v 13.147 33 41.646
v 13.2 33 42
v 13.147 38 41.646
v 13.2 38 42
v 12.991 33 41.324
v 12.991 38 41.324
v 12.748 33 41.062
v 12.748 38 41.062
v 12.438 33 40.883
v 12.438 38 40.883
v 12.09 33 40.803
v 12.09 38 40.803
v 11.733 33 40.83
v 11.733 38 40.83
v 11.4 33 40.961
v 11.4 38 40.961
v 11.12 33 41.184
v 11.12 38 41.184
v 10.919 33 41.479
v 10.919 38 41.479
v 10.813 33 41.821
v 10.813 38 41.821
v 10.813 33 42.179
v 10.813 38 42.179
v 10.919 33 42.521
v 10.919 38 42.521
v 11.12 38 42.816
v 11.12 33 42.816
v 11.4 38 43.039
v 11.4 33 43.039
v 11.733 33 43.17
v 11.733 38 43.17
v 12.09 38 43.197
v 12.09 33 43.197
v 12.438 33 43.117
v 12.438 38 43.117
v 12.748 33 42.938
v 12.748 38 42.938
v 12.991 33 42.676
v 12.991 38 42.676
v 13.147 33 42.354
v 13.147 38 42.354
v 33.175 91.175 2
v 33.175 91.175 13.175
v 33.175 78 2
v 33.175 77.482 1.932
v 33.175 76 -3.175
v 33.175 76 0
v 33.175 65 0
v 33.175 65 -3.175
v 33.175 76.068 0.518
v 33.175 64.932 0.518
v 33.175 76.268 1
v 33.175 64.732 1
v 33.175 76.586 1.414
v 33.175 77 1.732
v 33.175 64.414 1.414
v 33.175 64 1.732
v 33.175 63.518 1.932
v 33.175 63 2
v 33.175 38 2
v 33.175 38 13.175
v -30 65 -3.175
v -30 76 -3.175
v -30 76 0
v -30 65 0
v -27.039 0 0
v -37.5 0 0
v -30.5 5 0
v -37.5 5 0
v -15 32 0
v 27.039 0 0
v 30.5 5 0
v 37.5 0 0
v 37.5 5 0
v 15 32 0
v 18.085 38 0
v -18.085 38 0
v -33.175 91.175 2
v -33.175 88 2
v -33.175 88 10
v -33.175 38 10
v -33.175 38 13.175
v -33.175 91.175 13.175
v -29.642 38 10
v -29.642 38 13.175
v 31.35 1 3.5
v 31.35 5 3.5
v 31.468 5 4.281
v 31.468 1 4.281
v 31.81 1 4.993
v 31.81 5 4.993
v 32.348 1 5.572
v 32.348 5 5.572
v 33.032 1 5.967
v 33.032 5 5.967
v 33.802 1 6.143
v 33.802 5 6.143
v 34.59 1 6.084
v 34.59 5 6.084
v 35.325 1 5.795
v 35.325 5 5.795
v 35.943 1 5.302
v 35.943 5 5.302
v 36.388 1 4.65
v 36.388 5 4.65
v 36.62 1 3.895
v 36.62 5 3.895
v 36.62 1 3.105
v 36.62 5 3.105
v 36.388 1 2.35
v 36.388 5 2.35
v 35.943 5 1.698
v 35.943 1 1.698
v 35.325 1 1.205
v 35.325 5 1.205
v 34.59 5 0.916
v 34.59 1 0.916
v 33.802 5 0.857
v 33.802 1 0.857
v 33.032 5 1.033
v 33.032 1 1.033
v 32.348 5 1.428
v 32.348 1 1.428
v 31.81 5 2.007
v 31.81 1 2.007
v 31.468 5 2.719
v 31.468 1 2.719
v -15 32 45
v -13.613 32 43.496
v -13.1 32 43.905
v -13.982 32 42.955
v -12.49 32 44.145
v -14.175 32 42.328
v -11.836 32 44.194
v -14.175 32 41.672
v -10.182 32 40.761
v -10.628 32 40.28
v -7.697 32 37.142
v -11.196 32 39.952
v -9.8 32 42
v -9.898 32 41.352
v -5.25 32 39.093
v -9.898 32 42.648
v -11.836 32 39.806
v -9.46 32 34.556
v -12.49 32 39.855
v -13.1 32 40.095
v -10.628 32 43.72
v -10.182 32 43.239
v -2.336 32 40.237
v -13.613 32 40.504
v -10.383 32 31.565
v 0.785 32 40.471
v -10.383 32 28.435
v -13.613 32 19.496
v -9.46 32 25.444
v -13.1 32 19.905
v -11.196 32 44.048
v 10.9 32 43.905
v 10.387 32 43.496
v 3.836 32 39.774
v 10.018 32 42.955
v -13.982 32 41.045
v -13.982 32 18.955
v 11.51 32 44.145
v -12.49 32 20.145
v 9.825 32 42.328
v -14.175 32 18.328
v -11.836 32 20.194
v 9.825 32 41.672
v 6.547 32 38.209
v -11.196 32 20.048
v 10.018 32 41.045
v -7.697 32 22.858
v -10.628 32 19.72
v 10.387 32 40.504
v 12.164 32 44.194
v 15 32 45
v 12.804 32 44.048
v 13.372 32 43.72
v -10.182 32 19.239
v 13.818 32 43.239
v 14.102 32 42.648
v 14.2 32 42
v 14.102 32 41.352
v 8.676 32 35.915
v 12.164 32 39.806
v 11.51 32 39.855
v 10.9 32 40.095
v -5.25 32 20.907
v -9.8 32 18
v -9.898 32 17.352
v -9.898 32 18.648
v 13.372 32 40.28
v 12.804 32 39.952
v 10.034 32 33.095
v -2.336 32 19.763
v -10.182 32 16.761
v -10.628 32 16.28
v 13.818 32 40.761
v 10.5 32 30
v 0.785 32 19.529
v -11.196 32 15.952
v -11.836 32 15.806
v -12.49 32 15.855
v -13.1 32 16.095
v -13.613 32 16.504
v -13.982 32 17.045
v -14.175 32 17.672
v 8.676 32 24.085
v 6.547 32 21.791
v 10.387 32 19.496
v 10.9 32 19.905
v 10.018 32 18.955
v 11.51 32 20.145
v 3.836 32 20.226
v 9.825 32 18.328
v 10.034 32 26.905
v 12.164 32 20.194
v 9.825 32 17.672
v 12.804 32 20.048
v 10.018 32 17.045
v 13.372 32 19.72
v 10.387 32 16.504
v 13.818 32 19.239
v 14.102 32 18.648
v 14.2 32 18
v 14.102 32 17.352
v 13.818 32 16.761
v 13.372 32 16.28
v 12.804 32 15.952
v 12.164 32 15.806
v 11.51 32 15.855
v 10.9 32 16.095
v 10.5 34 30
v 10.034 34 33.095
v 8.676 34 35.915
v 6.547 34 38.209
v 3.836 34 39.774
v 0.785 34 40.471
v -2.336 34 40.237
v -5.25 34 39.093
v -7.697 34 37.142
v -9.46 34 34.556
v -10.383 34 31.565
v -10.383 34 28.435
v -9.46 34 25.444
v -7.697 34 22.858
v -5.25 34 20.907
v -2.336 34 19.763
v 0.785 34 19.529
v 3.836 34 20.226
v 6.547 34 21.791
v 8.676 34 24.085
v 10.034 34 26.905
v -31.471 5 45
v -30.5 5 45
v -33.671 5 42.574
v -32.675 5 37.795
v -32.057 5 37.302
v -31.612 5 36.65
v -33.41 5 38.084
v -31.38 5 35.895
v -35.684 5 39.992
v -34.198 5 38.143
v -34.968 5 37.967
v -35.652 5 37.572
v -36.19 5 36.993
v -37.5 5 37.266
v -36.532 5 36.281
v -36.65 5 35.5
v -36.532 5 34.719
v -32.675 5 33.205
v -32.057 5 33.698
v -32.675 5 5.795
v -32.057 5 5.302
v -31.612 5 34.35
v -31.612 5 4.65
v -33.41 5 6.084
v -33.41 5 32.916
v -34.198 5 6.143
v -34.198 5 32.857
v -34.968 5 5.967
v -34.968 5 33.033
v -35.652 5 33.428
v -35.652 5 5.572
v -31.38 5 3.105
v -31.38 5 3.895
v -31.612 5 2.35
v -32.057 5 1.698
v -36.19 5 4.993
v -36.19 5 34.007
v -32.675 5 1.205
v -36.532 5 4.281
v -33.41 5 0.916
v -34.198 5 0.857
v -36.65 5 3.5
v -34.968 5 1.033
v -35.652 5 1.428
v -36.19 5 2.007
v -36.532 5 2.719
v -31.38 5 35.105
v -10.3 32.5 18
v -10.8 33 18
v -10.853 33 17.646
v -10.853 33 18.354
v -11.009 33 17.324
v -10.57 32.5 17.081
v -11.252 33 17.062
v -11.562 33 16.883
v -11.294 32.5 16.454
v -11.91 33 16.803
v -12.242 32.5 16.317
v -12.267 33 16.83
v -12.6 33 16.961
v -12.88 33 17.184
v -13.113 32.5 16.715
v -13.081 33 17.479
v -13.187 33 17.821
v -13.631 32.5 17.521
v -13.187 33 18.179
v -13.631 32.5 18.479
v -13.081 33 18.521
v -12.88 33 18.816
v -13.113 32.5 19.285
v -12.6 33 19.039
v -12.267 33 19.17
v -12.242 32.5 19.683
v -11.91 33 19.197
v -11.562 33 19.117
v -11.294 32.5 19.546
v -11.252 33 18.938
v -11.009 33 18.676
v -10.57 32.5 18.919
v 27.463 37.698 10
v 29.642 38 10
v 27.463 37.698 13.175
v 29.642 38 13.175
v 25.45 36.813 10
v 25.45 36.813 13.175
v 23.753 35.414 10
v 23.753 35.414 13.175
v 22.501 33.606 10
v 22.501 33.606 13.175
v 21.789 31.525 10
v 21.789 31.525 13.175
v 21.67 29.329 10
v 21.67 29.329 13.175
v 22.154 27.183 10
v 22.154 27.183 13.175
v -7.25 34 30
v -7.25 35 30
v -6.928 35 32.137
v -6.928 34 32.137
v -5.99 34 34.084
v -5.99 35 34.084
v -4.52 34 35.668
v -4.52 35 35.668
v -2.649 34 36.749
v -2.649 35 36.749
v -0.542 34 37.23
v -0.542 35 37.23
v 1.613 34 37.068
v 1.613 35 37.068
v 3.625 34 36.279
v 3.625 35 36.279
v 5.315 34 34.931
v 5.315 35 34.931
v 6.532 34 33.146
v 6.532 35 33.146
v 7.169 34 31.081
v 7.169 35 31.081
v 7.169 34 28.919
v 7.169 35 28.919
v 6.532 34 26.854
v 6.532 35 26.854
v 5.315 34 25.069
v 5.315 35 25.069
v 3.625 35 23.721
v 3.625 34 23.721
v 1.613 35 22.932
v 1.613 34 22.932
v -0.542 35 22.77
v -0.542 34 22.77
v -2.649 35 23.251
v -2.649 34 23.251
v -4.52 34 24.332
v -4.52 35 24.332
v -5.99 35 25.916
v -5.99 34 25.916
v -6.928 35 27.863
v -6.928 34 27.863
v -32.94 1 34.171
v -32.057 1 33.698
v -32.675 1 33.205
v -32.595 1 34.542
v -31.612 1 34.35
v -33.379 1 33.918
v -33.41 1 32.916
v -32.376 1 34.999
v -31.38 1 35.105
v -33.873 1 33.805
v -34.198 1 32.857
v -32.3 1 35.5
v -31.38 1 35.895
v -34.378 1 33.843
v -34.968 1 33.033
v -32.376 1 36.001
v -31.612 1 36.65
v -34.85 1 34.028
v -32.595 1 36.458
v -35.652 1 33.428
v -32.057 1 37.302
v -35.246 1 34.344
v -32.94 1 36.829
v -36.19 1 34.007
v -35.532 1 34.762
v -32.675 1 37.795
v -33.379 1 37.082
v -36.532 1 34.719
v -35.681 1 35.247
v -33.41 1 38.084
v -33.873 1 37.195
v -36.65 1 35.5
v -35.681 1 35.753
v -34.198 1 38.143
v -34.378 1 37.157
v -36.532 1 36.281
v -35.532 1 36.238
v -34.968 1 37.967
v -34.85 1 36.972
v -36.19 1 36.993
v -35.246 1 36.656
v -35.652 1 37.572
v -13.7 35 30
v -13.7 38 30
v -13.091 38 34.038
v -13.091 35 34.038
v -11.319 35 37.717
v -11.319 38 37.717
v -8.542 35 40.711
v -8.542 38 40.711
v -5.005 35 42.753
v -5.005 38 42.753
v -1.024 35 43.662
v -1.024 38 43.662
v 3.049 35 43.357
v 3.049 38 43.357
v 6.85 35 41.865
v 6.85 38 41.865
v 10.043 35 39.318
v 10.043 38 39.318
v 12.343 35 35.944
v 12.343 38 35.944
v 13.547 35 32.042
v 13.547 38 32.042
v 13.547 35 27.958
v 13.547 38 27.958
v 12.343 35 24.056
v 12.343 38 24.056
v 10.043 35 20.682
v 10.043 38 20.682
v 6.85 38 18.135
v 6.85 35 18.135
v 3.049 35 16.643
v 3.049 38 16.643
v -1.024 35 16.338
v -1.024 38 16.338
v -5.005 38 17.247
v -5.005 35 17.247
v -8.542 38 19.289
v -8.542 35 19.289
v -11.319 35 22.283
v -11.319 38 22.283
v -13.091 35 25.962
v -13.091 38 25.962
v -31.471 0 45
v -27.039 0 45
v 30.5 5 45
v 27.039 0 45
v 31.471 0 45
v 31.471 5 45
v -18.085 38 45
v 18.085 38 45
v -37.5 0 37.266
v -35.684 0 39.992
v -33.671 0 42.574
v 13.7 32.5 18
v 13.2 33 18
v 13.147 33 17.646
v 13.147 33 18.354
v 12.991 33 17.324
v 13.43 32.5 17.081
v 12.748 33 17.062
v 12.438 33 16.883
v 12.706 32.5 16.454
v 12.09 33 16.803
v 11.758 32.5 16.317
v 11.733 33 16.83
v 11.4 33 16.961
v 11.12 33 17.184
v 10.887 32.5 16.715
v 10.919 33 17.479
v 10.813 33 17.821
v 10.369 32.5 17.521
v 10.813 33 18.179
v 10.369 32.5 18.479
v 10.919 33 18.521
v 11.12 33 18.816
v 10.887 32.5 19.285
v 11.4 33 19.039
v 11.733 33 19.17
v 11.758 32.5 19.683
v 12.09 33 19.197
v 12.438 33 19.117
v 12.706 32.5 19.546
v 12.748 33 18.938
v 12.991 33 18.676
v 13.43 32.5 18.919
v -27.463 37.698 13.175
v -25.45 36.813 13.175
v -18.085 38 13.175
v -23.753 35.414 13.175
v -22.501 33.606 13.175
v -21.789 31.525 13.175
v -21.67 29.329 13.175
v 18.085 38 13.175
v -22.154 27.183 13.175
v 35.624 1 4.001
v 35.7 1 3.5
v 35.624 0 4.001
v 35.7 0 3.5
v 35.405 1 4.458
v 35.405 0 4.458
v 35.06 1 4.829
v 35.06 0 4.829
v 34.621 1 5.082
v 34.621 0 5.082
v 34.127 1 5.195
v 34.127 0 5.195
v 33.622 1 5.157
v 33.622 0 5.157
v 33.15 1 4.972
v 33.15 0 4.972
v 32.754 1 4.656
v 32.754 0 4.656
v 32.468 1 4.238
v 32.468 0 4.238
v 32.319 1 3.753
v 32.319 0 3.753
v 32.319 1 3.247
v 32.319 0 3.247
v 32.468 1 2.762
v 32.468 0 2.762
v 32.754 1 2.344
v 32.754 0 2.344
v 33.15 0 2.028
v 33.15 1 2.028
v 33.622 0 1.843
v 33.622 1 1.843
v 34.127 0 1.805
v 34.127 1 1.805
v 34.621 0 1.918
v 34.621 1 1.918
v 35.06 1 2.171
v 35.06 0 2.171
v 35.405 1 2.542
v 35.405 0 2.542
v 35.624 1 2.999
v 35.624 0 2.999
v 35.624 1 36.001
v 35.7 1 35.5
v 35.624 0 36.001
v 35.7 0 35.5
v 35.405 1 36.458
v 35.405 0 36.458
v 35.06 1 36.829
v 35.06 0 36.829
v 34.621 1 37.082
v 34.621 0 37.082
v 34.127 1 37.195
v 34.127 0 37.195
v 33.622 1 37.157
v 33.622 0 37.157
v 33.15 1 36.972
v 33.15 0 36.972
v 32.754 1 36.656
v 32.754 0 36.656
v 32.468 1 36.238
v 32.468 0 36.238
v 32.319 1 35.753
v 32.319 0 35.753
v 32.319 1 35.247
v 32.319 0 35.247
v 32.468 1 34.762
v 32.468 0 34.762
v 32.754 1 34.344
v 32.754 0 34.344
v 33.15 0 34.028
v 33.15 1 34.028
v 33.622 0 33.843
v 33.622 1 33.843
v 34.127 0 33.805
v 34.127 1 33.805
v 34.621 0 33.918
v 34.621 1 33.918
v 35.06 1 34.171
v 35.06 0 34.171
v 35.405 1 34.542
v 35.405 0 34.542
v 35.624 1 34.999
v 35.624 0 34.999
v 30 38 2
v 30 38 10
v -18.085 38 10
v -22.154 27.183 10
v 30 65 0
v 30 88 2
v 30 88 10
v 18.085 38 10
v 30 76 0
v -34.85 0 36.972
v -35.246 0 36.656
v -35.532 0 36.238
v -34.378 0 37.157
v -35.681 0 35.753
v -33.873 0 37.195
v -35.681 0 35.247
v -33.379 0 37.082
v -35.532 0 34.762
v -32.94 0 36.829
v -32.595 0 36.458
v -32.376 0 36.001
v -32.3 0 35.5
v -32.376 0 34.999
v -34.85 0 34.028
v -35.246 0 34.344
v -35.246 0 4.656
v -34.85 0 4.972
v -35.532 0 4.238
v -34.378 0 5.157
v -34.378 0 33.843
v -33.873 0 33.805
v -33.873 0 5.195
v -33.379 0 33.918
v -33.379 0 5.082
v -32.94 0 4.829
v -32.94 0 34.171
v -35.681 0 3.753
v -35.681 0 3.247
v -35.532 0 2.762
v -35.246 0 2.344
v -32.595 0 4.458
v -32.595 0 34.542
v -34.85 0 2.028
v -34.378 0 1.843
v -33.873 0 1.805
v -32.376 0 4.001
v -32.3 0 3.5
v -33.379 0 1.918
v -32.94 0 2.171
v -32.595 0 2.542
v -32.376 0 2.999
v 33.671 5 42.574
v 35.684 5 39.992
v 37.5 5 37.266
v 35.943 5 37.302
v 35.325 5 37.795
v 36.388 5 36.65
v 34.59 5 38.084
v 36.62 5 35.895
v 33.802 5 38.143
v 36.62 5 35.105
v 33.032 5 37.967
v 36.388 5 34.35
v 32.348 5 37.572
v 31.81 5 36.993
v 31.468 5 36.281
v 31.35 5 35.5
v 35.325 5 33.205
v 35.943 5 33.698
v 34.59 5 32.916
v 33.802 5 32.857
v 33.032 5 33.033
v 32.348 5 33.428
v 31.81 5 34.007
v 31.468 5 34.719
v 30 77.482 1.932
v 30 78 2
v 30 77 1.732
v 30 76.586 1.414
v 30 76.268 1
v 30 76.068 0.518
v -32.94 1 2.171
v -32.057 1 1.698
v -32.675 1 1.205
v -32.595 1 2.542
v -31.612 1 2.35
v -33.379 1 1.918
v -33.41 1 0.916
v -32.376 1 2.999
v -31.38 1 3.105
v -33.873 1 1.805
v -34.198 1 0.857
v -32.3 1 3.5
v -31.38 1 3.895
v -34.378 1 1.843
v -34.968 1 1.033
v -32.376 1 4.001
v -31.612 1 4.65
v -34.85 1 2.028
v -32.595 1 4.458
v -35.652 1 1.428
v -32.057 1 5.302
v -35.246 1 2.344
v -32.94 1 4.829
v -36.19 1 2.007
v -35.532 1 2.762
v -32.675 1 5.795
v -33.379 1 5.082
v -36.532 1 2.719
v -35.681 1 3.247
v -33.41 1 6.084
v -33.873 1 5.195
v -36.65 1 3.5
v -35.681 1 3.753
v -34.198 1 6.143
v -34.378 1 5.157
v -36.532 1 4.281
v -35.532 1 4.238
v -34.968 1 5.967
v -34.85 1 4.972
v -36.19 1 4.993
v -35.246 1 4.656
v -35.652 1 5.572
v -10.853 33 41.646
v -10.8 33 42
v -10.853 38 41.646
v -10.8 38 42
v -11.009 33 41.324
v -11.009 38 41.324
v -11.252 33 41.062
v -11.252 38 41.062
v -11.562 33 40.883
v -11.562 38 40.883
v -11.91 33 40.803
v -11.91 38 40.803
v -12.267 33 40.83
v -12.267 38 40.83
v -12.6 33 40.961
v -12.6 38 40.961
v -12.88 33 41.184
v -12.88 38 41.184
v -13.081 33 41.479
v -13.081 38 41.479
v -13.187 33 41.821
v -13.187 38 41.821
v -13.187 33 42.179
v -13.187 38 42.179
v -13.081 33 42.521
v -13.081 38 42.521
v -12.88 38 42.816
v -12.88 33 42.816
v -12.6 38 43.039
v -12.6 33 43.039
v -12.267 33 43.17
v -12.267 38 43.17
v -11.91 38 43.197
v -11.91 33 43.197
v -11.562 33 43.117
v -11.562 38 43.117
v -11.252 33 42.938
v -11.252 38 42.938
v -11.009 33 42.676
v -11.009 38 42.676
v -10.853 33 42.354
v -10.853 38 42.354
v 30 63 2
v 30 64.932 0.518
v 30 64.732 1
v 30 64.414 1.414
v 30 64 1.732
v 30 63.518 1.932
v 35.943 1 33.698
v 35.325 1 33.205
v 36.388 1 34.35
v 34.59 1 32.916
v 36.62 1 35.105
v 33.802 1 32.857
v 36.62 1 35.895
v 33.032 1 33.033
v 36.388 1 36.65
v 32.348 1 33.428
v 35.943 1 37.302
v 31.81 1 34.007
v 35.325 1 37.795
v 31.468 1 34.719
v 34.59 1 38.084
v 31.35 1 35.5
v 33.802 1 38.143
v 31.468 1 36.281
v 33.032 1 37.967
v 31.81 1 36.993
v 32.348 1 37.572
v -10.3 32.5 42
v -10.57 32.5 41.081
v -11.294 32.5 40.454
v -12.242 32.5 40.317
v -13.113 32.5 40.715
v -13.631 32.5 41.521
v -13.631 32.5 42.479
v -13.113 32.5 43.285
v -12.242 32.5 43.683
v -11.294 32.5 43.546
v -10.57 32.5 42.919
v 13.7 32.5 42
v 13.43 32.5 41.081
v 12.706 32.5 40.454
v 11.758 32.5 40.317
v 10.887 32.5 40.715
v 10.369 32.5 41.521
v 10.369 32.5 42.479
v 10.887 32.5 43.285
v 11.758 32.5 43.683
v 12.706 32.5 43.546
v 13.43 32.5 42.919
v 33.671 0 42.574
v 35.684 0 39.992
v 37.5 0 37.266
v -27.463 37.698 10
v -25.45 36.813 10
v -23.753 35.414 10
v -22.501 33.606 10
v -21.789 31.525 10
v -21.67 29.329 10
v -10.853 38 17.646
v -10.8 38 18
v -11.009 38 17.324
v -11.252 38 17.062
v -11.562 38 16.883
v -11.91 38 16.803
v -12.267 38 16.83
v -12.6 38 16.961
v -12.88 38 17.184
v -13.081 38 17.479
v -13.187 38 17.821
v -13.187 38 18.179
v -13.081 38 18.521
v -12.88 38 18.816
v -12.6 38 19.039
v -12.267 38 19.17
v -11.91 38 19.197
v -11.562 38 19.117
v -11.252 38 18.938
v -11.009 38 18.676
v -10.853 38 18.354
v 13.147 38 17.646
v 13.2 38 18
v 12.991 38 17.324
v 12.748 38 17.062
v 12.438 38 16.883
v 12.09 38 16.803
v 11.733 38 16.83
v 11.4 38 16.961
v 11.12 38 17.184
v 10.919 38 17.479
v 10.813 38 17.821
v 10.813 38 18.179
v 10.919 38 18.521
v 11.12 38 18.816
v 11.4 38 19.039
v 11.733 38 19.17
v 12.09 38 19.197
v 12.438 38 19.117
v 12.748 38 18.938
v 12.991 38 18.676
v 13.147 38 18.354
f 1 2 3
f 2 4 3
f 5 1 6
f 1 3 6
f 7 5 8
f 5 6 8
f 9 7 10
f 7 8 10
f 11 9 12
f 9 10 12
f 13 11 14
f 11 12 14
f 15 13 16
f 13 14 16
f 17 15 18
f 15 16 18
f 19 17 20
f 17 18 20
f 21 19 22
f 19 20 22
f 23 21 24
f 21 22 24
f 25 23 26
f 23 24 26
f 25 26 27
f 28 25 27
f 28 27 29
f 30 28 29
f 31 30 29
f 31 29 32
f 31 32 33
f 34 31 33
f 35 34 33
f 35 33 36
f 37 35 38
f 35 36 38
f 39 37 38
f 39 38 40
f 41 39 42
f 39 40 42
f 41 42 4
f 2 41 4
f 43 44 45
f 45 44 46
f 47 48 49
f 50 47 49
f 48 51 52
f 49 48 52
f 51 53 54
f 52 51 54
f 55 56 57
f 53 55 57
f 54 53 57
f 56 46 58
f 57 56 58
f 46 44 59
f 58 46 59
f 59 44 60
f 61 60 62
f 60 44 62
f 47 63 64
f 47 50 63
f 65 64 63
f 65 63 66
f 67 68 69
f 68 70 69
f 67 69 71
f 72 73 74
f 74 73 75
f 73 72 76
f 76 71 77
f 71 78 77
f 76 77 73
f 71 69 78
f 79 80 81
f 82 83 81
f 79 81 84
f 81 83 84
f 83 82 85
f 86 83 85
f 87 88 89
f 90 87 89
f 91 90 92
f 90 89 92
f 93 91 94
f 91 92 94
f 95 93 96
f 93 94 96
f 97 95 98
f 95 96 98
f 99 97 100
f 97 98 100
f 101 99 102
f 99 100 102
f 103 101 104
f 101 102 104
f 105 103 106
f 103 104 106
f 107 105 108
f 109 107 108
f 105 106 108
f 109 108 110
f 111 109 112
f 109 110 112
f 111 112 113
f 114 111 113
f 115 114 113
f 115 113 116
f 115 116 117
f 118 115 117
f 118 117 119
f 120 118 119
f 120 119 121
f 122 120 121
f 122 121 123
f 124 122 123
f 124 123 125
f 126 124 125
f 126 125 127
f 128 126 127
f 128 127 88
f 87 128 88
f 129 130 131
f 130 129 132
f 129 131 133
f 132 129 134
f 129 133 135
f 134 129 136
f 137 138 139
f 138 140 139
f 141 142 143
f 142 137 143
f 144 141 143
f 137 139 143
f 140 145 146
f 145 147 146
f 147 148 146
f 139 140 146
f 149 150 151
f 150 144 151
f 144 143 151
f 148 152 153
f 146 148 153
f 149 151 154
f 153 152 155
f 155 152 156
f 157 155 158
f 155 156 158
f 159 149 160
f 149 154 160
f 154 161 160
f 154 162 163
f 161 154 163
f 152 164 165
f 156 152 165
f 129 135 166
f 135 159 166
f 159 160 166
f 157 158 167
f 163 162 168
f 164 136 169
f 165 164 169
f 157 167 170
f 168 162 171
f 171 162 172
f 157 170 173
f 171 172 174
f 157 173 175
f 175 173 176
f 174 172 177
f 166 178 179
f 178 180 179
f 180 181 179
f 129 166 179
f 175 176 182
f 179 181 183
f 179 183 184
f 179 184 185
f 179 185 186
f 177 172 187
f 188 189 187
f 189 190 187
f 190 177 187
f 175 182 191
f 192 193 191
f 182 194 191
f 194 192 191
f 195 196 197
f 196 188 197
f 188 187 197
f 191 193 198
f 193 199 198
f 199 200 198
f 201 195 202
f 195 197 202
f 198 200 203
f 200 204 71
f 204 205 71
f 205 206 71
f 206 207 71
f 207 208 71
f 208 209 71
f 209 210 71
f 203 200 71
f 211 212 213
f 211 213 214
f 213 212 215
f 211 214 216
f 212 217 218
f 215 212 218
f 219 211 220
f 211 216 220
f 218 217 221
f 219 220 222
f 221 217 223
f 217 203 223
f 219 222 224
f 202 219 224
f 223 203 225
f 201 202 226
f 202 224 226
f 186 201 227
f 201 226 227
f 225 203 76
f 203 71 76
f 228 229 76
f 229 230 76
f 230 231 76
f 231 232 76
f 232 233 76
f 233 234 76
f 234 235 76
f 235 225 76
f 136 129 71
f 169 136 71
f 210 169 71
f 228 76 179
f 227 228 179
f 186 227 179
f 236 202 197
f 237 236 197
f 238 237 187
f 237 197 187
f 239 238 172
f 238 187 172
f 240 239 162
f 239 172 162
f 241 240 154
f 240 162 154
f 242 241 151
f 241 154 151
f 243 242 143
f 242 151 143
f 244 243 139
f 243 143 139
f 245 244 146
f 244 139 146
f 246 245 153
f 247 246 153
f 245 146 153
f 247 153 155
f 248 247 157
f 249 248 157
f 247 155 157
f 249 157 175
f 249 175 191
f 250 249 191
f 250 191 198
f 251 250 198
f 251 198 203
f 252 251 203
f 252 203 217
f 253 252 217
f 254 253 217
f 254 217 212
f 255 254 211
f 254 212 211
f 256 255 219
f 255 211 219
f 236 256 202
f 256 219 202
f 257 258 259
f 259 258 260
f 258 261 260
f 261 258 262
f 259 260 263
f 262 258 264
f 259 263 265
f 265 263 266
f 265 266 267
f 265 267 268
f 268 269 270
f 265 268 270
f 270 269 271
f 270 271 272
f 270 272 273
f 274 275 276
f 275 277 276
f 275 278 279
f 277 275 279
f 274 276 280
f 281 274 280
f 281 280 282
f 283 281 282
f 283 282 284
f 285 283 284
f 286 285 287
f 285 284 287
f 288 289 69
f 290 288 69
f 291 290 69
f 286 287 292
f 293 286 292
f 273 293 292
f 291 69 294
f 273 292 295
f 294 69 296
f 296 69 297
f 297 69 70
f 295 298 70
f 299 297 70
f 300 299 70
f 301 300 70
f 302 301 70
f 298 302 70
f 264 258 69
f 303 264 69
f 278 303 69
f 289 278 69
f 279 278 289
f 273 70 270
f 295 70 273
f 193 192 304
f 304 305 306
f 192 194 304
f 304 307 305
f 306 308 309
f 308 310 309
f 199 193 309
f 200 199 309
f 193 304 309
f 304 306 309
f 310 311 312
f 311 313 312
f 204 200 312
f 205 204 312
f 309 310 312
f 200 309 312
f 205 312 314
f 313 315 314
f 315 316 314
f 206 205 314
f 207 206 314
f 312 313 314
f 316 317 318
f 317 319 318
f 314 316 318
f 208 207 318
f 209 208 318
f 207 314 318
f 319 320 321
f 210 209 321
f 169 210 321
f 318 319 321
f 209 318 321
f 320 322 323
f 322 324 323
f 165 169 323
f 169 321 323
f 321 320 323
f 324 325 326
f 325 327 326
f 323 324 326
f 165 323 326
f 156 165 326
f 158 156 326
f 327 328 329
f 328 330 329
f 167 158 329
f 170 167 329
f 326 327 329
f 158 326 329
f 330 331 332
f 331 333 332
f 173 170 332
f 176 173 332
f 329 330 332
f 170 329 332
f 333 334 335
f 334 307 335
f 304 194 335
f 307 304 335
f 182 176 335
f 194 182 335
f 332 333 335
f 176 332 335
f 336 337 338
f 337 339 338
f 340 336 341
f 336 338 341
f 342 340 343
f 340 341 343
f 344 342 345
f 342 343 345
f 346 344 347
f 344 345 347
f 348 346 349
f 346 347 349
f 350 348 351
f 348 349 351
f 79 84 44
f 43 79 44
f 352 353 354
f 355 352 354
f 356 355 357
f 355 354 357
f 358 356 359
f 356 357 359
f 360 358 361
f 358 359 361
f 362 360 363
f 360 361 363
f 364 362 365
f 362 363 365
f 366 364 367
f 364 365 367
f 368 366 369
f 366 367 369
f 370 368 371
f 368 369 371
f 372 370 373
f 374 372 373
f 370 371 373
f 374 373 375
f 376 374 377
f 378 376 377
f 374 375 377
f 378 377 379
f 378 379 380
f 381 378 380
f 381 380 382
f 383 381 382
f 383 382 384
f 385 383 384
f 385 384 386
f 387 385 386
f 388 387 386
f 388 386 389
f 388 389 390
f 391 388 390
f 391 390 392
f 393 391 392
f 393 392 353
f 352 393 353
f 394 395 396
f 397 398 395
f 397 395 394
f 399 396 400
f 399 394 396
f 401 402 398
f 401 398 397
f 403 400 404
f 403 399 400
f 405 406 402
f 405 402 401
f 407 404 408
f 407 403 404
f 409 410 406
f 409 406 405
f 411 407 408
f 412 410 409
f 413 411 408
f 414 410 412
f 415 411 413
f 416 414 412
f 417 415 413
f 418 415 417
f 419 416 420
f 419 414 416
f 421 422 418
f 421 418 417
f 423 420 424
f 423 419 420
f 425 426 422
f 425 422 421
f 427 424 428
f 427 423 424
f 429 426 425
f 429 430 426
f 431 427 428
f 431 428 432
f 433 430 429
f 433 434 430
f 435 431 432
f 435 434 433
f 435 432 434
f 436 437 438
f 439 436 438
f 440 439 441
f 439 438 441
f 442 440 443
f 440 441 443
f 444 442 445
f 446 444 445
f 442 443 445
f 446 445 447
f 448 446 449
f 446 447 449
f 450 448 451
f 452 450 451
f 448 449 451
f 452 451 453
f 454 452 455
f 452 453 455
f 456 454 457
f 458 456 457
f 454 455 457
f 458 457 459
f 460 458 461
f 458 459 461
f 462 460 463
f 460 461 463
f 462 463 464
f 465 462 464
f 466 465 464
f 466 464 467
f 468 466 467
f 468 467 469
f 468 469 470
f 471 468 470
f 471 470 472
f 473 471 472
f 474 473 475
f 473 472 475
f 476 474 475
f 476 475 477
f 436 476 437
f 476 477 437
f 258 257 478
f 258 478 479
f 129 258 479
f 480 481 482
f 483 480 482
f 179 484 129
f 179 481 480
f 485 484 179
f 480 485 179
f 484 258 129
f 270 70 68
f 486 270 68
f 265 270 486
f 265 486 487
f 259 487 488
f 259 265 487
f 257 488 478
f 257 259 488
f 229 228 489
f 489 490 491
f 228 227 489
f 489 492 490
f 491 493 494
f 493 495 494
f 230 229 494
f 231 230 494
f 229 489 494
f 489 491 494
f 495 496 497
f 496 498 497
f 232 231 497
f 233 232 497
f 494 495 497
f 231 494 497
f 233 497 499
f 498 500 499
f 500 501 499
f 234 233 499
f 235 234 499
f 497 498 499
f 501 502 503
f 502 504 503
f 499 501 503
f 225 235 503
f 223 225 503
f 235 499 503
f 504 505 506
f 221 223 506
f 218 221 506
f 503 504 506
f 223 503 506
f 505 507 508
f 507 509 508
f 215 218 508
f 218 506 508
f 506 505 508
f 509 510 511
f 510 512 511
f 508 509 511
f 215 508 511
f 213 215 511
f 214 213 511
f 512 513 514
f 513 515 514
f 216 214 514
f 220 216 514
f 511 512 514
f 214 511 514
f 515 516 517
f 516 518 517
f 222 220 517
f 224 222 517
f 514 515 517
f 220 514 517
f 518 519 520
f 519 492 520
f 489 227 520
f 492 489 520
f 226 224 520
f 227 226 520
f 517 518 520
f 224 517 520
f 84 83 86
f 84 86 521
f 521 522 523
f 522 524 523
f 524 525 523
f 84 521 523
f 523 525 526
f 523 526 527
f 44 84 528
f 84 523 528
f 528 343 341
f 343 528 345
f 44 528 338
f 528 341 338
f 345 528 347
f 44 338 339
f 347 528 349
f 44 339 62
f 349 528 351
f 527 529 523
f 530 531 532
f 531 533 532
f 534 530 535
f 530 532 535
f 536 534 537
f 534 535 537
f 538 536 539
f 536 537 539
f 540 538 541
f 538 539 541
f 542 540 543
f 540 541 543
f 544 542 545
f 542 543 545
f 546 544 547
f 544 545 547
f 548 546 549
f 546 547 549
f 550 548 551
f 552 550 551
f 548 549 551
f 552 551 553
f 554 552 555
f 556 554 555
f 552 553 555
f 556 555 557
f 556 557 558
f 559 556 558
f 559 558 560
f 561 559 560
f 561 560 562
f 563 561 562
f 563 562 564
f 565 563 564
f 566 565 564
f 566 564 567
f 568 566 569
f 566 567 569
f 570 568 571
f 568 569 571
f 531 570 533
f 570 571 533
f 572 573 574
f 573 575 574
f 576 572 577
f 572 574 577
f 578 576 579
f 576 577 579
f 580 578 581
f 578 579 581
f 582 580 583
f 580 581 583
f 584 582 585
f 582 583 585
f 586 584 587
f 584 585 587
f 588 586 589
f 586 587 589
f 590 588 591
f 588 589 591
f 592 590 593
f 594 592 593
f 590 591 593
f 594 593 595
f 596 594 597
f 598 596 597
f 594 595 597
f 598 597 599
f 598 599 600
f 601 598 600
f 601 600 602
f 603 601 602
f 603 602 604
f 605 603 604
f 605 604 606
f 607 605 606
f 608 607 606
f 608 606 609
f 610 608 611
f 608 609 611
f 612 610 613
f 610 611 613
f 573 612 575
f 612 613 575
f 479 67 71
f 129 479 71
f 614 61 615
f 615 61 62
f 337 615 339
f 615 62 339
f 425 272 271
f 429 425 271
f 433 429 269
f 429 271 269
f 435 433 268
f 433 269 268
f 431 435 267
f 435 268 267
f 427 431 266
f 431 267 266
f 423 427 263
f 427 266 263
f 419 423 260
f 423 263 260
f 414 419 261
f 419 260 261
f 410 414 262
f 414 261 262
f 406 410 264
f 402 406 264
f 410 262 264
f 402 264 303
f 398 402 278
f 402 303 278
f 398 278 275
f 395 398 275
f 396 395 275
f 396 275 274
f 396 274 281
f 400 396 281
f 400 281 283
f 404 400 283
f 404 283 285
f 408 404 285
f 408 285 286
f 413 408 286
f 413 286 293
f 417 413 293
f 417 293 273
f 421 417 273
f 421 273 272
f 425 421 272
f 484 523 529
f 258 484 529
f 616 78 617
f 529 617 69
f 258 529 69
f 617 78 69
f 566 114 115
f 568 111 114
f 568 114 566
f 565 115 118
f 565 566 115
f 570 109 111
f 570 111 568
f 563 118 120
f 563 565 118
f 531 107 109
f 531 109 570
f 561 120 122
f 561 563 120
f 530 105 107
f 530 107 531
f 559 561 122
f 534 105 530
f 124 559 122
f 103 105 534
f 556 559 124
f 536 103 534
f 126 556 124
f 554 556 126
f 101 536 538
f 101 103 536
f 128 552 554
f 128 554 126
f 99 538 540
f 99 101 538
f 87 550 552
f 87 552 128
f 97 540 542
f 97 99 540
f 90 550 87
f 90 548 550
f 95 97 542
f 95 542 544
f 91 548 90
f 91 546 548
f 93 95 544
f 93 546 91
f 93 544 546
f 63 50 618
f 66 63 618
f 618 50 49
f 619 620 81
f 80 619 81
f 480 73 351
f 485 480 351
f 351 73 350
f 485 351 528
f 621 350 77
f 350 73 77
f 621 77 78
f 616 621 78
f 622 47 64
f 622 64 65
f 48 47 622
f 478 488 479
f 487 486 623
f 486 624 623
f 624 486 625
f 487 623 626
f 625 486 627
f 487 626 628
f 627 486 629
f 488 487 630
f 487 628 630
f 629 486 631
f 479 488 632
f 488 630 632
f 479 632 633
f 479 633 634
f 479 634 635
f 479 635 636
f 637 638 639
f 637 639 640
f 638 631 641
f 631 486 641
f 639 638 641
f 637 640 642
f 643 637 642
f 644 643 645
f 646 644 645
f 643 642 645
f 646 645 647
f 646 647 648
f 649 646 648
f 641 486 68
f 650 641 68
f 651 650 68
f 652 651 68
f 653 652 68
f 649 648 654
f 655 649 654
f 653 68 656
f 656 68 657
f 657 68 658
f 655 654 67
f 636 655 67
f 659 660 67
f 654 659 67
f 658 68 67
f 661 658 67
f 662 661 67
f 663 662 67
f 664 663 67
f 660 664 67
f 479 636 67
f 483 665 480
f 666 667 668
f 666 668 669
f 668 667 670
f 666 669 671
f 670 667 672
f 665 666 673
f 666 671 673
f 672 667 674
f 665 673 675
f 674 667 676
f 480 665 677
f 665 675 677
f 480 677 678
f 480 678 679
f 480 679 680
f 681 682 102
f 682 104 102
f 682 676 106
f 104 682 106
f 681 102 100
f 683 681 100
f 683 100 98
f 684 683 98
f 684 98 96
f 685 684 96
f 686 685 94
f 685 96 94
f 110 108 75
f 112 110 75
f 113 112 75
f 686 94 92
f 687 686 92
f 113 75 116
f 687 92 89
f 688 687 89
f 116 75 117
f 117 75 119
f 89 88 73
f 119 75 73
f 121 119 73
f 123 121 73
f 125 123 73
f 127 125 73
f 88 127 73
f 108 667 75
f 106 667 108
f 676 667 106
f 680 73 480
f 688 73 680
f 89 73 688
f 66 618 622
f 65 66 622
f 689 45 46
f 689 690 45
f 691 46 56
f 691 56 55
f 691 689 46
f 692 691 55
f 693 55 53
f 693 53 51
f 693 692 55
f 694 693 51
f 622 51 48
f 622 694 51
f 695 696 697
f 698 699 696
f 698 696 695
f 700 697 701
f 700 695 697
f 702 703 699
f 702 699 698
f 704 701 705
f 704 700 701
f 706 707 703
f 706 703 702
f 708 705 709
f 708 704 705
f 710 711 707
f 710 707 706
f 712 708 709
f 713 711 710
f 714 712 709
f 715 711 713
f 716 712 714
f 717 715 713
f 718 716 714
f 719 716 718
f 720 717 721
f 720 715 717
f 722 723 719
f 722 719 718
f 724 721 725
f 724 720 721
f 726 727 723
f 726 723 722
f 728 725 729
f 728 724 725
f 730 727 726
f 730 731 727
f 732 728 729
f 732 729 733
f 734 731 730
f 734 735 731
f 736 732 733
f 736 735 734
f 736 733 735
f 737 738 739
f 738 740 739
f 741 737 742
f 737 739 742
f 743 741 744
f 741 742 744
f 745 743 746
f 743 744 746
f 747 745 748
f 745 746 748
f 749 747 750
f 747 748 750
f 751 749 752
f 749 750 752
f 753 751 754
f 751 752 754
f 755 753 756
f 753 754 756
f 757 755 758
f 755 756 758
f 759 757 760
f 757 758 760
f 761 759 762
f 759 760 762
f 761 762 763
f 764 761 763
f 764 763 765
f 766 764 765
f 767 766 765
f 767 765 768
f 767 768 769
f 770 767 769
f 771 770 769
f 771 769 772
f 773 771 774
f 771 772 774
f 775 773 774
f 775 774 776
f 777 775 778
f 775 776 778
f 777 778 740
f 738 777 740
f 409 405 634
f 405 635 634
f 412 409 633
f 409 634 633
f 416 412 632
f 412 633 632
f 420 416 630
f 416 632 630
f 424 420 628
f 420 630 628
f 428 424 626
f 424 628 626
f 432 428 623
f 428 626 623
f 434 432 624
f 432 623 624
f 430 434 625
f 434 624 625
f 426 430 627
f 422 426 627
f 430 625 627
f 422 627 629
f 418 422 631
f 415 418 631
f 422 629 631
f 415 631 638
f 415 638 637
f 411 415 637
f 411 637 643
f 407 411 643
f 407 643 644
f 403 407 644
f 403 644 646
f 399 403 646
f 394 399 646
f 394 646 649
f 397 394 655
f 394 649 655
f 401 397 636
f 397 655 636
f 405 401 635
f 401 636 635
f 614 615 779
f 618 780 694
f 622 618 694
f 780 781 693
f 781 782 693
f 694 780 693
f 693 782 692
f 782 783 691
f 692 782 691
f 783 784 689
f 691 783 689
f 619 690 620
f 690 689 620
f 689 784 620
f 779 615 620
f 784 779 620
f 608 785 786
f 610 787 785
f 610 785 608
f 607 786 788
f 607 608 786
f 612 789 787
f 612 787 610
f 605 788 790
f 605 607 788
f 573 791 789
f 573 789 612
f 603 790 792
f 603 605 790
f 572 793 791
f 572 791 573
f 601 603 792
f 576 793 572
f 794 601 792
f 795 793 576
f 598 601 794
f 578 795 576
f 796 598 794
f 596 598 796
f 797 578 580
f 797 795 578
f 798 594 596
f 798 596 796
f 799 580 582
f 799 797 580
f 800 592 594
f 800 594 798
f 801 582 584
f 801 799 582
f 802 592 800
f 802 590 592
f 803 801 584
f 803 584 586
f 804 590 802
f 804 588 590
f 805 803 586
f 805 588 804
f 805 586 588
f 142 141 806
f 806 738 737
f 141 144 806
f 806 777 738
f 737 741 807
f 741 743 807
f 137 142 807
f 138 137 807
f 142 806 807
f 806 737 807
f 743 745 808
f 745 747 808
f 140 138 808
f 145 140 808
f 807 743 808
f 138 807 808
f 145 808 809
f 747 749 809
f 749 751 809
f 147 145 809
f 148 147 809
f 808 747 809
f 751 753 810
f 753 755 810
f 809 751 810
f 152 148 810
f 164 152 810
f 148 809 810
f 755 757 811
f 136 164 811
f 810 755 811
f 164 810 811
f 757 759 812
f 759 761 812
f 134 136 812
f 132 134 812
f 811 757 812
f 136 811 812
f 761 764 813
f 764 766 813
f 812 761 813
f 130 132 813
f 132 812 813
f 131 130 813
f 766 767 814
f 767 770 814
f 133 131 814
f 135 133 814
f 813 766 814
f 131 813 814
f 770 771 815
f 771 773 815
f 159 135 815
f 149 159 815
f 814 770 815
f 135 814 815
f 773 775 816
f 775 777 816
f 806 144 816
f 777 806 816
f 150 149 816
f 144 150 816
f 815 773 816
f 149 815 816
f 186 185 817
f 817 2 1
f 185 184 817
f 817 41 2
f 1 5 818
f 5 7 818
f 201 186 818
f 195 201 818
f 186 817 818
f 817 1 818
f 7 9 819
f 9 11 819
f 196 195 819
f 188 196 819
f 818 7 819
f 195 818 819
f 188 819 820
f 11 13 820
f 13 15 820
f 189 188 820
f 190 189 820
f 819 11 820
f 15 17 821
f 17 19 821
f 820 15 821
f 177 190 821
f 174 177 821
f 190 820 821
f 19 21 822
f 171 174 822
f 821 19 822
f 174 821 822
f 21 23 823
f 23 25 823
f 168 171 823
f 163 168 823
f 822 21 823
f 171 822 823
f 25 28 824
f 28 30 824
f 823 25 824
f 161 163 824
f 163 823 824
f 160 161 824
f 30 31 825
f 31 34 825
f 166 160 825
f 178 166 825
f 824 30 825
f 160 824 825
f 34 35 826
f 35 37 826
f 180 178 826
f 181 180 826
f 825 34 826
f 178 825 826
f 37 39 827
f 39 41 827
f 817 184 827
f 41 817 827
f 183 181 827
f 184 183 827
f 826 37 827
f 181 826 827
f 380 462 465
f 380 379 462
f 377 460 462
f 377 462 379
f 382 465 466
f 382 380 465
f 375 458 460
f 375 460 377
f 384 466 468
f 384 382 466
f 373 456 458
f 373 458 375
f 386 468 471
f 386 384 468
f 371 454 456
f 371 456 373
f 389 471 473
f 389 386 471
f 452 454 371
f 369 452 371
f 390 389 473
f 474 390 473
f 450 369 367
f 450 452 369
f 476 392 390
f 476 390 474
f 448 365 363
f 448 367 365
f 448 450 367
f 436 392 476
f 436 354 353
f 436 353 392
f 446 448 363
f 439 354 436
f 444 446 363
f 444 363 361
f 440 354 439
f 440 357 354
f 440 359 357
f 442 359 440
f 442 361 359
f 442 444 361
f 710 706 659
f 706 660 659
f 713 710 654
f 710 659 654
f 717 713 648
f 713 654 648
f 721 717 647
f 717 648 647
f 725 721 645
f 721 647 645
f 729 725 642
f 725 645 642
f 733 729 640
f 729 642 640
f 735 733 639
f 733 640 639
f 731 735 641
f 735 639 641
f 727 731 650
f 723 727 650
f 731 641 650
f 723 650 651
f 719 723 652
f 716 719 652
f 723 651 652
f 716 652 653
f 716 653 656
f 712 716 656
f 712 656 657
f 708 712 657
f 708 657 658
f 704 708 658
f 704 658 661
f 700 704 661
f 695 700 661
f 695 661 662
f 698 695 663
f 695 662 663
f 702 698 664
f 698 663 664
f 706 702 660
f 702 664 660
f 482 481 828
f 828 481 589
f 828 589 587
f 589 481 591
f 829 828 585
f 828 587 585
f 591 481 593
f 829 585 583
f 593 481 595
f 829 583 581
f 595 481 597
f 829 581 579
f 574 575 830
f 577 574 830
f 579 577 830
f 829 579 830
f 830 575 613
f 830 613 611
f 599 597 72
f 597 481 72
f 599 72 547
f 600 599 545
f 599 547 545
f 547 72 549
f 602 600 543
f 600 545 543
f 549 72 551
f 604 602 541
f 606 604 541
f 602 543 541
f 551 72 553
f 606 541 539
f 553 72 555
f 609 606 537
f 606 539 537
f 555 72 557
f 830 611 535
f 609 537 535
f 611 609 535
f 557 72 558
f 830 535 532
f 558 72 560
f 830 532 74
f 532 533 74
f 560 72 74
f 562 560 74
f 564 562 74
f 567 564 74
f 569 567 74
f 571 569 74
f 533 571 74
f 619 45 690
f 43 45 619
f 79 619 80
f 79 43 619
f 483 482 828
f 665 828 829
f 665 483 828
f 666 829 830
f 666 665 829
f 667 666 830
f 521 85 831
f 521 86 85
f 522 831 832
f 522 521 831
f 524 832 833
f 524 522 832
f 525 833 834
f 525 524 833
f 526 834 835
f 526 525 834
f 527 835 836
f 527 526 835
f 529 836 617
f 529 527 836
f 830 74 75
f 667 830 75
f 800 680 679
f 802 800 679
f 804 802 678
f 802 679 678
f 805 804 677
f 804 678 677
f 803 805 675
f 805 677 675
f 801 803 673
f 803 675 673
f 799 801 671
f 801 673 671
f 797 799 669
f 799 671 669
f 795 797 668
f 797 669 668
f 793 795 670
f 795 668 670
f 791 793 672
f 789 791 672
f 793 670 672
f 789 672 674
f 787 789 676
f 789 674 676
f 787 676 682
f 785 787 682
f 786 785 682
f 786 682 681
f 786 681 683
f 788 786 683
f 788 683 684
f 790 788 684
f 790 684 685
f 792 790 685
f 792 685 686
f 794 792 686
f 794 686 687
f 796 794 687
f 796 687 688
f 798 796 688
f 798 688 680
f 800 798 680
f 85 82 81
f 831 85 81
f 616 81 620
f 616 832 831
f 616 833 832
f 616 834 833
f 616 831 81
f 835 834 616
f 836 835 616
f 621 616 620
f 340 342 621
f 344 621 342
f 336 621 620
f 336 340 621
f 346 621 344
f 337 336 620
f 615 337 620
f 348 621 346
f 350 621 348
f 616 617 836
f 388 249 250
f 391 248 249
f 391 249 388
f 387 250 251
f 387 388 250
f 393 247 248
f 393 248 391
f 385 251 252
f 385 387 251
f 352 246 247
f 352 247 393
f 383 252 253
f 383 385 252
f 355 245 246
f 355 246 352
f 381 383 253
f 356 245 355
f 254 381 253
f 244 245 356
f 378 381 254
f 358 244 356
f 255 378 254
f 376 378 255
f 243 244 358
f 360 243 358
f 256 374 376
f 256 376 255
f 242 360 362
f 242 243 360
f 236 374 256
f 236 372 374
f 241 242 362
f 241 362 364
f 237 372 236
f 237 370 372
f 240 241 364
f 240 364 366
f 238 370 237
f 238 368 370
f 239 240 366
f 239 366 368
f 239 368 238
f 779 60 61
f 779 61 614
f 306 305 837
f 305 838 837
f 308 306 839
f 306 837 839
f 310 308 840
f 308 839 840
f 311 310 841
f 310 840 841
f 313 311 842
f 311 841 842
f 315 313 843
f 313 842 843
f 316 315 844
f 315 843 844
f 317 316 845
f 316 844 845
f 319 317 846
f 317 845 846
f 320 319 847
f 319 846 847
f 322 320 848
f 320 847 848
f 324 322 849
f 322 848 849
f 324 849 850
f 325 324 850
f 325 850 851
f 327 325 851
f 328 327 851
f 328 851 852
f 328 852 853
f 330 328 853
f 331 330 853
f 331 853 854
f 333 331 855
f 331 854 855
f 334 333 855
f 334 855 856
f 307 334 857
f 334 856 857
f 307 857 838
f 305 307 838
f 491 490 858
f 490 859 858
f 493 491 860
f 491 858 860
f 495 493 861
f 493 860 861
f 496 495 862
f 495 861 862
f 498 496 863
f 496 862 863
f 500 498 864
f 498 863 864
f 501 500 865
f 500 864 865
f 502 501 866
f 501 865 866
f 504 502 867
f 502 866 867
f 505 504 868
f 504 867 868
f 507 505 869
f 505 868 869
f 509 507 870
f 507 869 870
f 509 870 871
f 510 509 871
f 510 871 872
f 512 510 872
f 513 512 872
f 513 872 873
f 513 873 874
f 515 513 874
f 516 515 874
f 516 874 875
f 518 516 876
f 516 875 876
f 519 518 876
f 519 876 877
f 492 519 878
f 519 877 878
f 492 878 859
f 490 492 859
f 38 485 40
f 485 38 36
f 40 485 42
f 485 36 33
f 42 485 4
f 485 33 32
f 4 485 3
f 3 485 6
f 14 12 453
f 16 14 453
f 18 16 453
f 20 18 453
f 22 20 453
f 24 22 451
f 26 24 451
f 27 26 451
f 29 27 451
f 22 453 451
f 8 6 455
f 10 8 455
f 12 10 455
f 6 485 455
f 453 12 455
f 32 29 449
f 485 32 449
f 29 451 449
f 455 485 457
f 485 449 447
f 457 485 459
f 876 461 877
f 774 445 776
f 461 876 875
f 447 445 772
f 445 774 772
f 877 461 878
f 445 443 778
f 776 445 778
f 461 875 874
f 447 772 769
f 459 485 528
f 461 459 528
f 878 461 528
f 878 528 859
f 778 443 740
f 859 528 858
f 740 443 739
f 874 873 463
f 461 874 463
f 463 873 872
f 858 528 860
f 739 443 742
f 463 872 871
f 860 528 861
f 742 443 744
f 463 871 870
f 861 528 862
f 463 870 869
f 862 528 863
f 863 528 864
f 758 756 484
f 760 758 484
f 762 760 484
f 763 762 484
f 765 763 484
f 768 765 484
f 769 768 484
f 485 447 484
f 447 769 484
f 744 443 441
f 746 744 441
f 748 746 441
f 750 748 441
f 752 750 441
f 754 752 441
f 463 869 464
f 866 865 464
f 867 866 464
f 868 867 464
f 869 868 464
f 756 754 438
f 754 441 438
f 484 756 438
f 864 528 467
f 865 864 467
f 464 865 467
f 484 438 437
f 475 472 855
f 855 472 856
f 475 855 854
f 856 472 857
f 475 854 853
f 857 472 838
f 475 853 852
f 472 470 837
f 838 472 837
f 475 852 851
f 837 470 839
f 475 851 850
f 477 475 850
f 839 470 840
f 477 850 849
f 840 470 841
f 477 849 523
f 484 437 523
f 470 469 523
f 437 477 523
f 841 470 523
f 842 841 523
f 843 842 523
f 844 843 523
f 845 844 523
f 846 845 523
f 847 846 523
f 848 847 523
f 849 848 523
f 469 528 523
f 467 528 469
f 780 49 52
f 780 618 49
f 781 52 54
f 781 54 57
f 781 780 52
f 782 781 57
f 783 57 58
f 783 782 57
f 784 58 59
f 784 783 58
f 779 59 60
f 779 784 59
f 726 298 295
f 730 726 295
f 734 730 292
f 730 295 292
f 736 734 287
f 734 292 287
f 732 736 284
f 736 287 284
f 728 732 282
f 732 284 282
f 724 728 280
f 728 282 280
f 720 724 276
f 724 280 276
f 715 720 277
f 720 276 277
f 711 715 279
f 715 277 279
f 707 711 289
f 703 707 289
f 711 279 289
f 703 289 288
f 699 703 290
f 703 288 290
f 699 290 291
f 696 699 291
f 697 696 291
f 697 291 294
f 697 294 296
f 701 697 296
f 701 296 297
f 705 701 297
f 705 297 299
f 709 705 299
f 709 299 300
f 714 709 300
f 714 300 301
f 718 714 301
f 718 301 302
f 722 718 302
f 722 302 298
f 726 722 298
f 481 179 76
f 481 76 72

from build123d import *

# Parameters (mm, degrees)
BOSS_EXTRUDE1_DEPTH                             = 45
SKETCH3_R                                       = 13.7
CUT_EXTRUDE1_DEPTH                              = 3
CSK_FOR_M2_FLAT_HEAD_MACHINE_SCREW1_D           = 2.4
CSK_FOR_M2_FLAT_HEAD_MACHINE_SCREW1_CSINK_D     = 4.4
CSK_FOR_M2_FLAT_HEAD_MACHINE_SCREW1_CSINK_ANGLE = 90
SKETCH10_R                                      = 7.25
CUT_EXTRUDE2_DEPTH                              = 69.23672032
SKETCH15_R                                      = 48.495489481
SKETCH15_R_2                                    = 44
CUT_EXTRUDE4_DEPTH                              = 70.822990483
SKETCH11_R                                      = 10.5
CUT_EXTRUDE3_DEPTH                              = 2
CBORE_FOR_M5_HEX_HEAD_BOLT1_D                   = 3.4
CBORE_FOR_M5_HEX_HEAD_BOLT1_CBORE_D             = 5.3
CBORE_FOR_M5_HEX_HEAD_BOLT1_CBORE_DEPTH         = 4
SKETCH19_W                                      = 66.35
SKETCH19_H                                      = 3.175
BOSS_EXTRUDE5_DEPTH                             = 53.175
BOSS_EXTRUDE9_DEPTH                             = 8
FILLET2_R                                       = 8
FILLET3_R                                       = 8
SKETCH24_W                                      = 3.175
SKETCH24_H                                      = 11
BOSS_EXTRUDE10_DEPTH                            = 5.175
SKETCH25_W                                      = 3.175
SKETCH25_H                                      = 11
BOSS_EXTRUDE11_DEPTH                            = 60
FILLET4_R                                       = 2


with BuildPart() as part:
    # Sketch1 → Boss-Extrude1 (new body)
    with BuildSketch(Plane.XY):
        Polygon((-37.5, 0), (-27.038942926, 0), (-15, 32), (15, 32), (27.038942926, 0), (37.5, 0), (37.5, 5), (30.5, 5), (18.084840108, 38), (-18.084840108, 38), (-30.5, 5), (-37.5, 5), align=None)
    extrude(amount=BOSS_EXTRUDE1_DEPTH)

    # Sketch3 → Cut-Extrude1 (cut)
    with BuildSketch(Plane(origin=(0, 38, 0), x_dir=(1, 0, 0), z_dir=(0, 1, 0))):
        with Locations(Location((0, -30, 0), (0, 0, 180))):
            Circle(SKETCH3_R)
    extrude(amount=-CUT_EXTRUDE1_DEPTH, mode=Mode.SUBTRACT)

    # CSK for M2 Flat Head Machine Screw1 (through all)
    with Locations(Plane(origin=(0, 32, 0), x_dir=(-1, 0, 0), z_dir=(0, -1, 0))):
        with Locations((12, -42), (-12, -42), (-12, -18), (12, -18)):
            CounterSinkHole(CSK_FOR_M2_FLAT_HEAD_MACHINE_SCREW1_D / 2, CSK_FOR_M2_FLAT_HEAD_MACHINE_SCREW1_CSINK_D / 2, counter_sink_angle=CSK_FOR_M2_FLAT_HEAD_MACHINE_SCREW1_CSINK_ANGLE)

    # Sketch10 → Cut-Extrude2 (cut, through all)
    with BuildSketch(Plane(origin=(0, 35, 0), x_dir=(1, 0, 0), z_dir=(0, 1, 0))):
        with Locations(Location((0, -30, 0), (0, 0, 180))):
            Circle(SKETCH10_R)
    extrude(amount=-CUT_EXTRUDE2_DEPTH, mode=Mode.SUBTRACT)

    # Sketch15 → Cut-Extrude4 (cut, through all)
    with BuildSketch(Plane(origin=(0, 38, 0), x_dir=(1, 0, 0), z_dir=(0, 1, 0))):
        with Locations((0, -14.25)):
            Circle(SKETCH15_R)
        with Locations((0, -14.25)):
            Circle(SKETCH15_R_2, mode=Mode.SUBTRACT)
    extrude(amount=-CUT_EXTRUDE4_DEPTH, mode=Mode.SUBTRACT)

    # Sketch11 → Cut-Extrude3 (cut)
    with BuildSketch(Plane.XZ.offset(-32)):
        with Locations((0, 30)):
            Circle(SKETCH11_R)
    extrude(amount=-CUT_EXTRUDE3_DEPTH, mode=Mode.SUBTRACT)

    # CBORE for M5 Hex Head Bolt1 (through all)
    with Locations(Plane(origin=(0, 5, 0), x_dir=(-1, 0, 0), z_dir=(0, 1, 0))):
        with Locations((34, 35.5), (34, 3.5), (-34, 3.5), (-34, 35.5)):
            CounterBoreHole(CBORE_FOR_M5_HEX_HEAD_BOLT1_D / 2, CBORE_FOR_M5_HEX_HEAD_BOLT1_CBORE_D / 2, CBORE_FOR_M5_HEX_HEAD_BOLT1_CBORE_DEPTH)

    # Sketch19 → Boss-Extrude5 (add)
    with BuildSketch(Plane(origin=(0, 38, 0), x_dir=(1, 0, 0), z_dir=(0, 1, 0))):
        with Locations((0, -11.5875)):
            Rectangle(SKETCH19_W, SKETCH19_H)
    extrude(amount=BOSS_EXTRUDE5_DEPTH)

    # Sketch23 → Boss-Extrude9 (add)
    with BuildSketch(Plane(origin=(0, 0, 10), x_dir=(-1, 0, 0), z_dir=(0, 0, -1))):
        Polygon((-33.175, 38), (-30, 38), (-30, 88), (33.175, 88), (33.175, 91.175), (-33.175, 91.175), align=None)
    extrude(amount=BOSS_EXTRUDE9_DEPTH)

    # Fillet2
    fillet2_edges = [part.edges().sort_by_distance(p)[0] for p in [
        (18.084840108, 38, 11.5875),
    ]]
    fillet(fillet2_edges, radius=FILLET2_R)

    # Fillet3
    fillet3_edges = [part.edges().sort_by_distance(p)[0] for p in [
        (-18.084840108, 38, 11.5875),
    ]]
    fillet(fillet3_edges, radius=FILLET3_R)

    # Sketch24 → Boss-Extrude10 (add)
    with BuildSketch(Plane(origin=(0, 0, 2), x_dir=(-1, 0, 0), z_dir=(0, 0, -1))):
        with Locations((-31.5875, 70.5)):
            Rectangle(SKETCH24_W, SKETCH24_H)
    extrude(amount=BOSS_EXTRUDE10_DEPTH)

    # Sketch25 → Boss-Extrude11 (add)
    with BuildSketch(Plane.ZY.offset(-30)):
        with Locations((-1.5875, 70.5)):
            Rectangle(SKETCH25_W, SKETCH25_H)
    extrude(amount=BOSS_EXTRUDE11_DEPTH)

    # Fillet4
    fillet4_edges = [part.edges().sort_by_distance(p)[0] for p in [
        (31.5875, 76, 2),
        (31.5875, 65, 2),
    ]]
    fillet(fillet4_edges, radius=FILLET4_R)


solid = part.part
